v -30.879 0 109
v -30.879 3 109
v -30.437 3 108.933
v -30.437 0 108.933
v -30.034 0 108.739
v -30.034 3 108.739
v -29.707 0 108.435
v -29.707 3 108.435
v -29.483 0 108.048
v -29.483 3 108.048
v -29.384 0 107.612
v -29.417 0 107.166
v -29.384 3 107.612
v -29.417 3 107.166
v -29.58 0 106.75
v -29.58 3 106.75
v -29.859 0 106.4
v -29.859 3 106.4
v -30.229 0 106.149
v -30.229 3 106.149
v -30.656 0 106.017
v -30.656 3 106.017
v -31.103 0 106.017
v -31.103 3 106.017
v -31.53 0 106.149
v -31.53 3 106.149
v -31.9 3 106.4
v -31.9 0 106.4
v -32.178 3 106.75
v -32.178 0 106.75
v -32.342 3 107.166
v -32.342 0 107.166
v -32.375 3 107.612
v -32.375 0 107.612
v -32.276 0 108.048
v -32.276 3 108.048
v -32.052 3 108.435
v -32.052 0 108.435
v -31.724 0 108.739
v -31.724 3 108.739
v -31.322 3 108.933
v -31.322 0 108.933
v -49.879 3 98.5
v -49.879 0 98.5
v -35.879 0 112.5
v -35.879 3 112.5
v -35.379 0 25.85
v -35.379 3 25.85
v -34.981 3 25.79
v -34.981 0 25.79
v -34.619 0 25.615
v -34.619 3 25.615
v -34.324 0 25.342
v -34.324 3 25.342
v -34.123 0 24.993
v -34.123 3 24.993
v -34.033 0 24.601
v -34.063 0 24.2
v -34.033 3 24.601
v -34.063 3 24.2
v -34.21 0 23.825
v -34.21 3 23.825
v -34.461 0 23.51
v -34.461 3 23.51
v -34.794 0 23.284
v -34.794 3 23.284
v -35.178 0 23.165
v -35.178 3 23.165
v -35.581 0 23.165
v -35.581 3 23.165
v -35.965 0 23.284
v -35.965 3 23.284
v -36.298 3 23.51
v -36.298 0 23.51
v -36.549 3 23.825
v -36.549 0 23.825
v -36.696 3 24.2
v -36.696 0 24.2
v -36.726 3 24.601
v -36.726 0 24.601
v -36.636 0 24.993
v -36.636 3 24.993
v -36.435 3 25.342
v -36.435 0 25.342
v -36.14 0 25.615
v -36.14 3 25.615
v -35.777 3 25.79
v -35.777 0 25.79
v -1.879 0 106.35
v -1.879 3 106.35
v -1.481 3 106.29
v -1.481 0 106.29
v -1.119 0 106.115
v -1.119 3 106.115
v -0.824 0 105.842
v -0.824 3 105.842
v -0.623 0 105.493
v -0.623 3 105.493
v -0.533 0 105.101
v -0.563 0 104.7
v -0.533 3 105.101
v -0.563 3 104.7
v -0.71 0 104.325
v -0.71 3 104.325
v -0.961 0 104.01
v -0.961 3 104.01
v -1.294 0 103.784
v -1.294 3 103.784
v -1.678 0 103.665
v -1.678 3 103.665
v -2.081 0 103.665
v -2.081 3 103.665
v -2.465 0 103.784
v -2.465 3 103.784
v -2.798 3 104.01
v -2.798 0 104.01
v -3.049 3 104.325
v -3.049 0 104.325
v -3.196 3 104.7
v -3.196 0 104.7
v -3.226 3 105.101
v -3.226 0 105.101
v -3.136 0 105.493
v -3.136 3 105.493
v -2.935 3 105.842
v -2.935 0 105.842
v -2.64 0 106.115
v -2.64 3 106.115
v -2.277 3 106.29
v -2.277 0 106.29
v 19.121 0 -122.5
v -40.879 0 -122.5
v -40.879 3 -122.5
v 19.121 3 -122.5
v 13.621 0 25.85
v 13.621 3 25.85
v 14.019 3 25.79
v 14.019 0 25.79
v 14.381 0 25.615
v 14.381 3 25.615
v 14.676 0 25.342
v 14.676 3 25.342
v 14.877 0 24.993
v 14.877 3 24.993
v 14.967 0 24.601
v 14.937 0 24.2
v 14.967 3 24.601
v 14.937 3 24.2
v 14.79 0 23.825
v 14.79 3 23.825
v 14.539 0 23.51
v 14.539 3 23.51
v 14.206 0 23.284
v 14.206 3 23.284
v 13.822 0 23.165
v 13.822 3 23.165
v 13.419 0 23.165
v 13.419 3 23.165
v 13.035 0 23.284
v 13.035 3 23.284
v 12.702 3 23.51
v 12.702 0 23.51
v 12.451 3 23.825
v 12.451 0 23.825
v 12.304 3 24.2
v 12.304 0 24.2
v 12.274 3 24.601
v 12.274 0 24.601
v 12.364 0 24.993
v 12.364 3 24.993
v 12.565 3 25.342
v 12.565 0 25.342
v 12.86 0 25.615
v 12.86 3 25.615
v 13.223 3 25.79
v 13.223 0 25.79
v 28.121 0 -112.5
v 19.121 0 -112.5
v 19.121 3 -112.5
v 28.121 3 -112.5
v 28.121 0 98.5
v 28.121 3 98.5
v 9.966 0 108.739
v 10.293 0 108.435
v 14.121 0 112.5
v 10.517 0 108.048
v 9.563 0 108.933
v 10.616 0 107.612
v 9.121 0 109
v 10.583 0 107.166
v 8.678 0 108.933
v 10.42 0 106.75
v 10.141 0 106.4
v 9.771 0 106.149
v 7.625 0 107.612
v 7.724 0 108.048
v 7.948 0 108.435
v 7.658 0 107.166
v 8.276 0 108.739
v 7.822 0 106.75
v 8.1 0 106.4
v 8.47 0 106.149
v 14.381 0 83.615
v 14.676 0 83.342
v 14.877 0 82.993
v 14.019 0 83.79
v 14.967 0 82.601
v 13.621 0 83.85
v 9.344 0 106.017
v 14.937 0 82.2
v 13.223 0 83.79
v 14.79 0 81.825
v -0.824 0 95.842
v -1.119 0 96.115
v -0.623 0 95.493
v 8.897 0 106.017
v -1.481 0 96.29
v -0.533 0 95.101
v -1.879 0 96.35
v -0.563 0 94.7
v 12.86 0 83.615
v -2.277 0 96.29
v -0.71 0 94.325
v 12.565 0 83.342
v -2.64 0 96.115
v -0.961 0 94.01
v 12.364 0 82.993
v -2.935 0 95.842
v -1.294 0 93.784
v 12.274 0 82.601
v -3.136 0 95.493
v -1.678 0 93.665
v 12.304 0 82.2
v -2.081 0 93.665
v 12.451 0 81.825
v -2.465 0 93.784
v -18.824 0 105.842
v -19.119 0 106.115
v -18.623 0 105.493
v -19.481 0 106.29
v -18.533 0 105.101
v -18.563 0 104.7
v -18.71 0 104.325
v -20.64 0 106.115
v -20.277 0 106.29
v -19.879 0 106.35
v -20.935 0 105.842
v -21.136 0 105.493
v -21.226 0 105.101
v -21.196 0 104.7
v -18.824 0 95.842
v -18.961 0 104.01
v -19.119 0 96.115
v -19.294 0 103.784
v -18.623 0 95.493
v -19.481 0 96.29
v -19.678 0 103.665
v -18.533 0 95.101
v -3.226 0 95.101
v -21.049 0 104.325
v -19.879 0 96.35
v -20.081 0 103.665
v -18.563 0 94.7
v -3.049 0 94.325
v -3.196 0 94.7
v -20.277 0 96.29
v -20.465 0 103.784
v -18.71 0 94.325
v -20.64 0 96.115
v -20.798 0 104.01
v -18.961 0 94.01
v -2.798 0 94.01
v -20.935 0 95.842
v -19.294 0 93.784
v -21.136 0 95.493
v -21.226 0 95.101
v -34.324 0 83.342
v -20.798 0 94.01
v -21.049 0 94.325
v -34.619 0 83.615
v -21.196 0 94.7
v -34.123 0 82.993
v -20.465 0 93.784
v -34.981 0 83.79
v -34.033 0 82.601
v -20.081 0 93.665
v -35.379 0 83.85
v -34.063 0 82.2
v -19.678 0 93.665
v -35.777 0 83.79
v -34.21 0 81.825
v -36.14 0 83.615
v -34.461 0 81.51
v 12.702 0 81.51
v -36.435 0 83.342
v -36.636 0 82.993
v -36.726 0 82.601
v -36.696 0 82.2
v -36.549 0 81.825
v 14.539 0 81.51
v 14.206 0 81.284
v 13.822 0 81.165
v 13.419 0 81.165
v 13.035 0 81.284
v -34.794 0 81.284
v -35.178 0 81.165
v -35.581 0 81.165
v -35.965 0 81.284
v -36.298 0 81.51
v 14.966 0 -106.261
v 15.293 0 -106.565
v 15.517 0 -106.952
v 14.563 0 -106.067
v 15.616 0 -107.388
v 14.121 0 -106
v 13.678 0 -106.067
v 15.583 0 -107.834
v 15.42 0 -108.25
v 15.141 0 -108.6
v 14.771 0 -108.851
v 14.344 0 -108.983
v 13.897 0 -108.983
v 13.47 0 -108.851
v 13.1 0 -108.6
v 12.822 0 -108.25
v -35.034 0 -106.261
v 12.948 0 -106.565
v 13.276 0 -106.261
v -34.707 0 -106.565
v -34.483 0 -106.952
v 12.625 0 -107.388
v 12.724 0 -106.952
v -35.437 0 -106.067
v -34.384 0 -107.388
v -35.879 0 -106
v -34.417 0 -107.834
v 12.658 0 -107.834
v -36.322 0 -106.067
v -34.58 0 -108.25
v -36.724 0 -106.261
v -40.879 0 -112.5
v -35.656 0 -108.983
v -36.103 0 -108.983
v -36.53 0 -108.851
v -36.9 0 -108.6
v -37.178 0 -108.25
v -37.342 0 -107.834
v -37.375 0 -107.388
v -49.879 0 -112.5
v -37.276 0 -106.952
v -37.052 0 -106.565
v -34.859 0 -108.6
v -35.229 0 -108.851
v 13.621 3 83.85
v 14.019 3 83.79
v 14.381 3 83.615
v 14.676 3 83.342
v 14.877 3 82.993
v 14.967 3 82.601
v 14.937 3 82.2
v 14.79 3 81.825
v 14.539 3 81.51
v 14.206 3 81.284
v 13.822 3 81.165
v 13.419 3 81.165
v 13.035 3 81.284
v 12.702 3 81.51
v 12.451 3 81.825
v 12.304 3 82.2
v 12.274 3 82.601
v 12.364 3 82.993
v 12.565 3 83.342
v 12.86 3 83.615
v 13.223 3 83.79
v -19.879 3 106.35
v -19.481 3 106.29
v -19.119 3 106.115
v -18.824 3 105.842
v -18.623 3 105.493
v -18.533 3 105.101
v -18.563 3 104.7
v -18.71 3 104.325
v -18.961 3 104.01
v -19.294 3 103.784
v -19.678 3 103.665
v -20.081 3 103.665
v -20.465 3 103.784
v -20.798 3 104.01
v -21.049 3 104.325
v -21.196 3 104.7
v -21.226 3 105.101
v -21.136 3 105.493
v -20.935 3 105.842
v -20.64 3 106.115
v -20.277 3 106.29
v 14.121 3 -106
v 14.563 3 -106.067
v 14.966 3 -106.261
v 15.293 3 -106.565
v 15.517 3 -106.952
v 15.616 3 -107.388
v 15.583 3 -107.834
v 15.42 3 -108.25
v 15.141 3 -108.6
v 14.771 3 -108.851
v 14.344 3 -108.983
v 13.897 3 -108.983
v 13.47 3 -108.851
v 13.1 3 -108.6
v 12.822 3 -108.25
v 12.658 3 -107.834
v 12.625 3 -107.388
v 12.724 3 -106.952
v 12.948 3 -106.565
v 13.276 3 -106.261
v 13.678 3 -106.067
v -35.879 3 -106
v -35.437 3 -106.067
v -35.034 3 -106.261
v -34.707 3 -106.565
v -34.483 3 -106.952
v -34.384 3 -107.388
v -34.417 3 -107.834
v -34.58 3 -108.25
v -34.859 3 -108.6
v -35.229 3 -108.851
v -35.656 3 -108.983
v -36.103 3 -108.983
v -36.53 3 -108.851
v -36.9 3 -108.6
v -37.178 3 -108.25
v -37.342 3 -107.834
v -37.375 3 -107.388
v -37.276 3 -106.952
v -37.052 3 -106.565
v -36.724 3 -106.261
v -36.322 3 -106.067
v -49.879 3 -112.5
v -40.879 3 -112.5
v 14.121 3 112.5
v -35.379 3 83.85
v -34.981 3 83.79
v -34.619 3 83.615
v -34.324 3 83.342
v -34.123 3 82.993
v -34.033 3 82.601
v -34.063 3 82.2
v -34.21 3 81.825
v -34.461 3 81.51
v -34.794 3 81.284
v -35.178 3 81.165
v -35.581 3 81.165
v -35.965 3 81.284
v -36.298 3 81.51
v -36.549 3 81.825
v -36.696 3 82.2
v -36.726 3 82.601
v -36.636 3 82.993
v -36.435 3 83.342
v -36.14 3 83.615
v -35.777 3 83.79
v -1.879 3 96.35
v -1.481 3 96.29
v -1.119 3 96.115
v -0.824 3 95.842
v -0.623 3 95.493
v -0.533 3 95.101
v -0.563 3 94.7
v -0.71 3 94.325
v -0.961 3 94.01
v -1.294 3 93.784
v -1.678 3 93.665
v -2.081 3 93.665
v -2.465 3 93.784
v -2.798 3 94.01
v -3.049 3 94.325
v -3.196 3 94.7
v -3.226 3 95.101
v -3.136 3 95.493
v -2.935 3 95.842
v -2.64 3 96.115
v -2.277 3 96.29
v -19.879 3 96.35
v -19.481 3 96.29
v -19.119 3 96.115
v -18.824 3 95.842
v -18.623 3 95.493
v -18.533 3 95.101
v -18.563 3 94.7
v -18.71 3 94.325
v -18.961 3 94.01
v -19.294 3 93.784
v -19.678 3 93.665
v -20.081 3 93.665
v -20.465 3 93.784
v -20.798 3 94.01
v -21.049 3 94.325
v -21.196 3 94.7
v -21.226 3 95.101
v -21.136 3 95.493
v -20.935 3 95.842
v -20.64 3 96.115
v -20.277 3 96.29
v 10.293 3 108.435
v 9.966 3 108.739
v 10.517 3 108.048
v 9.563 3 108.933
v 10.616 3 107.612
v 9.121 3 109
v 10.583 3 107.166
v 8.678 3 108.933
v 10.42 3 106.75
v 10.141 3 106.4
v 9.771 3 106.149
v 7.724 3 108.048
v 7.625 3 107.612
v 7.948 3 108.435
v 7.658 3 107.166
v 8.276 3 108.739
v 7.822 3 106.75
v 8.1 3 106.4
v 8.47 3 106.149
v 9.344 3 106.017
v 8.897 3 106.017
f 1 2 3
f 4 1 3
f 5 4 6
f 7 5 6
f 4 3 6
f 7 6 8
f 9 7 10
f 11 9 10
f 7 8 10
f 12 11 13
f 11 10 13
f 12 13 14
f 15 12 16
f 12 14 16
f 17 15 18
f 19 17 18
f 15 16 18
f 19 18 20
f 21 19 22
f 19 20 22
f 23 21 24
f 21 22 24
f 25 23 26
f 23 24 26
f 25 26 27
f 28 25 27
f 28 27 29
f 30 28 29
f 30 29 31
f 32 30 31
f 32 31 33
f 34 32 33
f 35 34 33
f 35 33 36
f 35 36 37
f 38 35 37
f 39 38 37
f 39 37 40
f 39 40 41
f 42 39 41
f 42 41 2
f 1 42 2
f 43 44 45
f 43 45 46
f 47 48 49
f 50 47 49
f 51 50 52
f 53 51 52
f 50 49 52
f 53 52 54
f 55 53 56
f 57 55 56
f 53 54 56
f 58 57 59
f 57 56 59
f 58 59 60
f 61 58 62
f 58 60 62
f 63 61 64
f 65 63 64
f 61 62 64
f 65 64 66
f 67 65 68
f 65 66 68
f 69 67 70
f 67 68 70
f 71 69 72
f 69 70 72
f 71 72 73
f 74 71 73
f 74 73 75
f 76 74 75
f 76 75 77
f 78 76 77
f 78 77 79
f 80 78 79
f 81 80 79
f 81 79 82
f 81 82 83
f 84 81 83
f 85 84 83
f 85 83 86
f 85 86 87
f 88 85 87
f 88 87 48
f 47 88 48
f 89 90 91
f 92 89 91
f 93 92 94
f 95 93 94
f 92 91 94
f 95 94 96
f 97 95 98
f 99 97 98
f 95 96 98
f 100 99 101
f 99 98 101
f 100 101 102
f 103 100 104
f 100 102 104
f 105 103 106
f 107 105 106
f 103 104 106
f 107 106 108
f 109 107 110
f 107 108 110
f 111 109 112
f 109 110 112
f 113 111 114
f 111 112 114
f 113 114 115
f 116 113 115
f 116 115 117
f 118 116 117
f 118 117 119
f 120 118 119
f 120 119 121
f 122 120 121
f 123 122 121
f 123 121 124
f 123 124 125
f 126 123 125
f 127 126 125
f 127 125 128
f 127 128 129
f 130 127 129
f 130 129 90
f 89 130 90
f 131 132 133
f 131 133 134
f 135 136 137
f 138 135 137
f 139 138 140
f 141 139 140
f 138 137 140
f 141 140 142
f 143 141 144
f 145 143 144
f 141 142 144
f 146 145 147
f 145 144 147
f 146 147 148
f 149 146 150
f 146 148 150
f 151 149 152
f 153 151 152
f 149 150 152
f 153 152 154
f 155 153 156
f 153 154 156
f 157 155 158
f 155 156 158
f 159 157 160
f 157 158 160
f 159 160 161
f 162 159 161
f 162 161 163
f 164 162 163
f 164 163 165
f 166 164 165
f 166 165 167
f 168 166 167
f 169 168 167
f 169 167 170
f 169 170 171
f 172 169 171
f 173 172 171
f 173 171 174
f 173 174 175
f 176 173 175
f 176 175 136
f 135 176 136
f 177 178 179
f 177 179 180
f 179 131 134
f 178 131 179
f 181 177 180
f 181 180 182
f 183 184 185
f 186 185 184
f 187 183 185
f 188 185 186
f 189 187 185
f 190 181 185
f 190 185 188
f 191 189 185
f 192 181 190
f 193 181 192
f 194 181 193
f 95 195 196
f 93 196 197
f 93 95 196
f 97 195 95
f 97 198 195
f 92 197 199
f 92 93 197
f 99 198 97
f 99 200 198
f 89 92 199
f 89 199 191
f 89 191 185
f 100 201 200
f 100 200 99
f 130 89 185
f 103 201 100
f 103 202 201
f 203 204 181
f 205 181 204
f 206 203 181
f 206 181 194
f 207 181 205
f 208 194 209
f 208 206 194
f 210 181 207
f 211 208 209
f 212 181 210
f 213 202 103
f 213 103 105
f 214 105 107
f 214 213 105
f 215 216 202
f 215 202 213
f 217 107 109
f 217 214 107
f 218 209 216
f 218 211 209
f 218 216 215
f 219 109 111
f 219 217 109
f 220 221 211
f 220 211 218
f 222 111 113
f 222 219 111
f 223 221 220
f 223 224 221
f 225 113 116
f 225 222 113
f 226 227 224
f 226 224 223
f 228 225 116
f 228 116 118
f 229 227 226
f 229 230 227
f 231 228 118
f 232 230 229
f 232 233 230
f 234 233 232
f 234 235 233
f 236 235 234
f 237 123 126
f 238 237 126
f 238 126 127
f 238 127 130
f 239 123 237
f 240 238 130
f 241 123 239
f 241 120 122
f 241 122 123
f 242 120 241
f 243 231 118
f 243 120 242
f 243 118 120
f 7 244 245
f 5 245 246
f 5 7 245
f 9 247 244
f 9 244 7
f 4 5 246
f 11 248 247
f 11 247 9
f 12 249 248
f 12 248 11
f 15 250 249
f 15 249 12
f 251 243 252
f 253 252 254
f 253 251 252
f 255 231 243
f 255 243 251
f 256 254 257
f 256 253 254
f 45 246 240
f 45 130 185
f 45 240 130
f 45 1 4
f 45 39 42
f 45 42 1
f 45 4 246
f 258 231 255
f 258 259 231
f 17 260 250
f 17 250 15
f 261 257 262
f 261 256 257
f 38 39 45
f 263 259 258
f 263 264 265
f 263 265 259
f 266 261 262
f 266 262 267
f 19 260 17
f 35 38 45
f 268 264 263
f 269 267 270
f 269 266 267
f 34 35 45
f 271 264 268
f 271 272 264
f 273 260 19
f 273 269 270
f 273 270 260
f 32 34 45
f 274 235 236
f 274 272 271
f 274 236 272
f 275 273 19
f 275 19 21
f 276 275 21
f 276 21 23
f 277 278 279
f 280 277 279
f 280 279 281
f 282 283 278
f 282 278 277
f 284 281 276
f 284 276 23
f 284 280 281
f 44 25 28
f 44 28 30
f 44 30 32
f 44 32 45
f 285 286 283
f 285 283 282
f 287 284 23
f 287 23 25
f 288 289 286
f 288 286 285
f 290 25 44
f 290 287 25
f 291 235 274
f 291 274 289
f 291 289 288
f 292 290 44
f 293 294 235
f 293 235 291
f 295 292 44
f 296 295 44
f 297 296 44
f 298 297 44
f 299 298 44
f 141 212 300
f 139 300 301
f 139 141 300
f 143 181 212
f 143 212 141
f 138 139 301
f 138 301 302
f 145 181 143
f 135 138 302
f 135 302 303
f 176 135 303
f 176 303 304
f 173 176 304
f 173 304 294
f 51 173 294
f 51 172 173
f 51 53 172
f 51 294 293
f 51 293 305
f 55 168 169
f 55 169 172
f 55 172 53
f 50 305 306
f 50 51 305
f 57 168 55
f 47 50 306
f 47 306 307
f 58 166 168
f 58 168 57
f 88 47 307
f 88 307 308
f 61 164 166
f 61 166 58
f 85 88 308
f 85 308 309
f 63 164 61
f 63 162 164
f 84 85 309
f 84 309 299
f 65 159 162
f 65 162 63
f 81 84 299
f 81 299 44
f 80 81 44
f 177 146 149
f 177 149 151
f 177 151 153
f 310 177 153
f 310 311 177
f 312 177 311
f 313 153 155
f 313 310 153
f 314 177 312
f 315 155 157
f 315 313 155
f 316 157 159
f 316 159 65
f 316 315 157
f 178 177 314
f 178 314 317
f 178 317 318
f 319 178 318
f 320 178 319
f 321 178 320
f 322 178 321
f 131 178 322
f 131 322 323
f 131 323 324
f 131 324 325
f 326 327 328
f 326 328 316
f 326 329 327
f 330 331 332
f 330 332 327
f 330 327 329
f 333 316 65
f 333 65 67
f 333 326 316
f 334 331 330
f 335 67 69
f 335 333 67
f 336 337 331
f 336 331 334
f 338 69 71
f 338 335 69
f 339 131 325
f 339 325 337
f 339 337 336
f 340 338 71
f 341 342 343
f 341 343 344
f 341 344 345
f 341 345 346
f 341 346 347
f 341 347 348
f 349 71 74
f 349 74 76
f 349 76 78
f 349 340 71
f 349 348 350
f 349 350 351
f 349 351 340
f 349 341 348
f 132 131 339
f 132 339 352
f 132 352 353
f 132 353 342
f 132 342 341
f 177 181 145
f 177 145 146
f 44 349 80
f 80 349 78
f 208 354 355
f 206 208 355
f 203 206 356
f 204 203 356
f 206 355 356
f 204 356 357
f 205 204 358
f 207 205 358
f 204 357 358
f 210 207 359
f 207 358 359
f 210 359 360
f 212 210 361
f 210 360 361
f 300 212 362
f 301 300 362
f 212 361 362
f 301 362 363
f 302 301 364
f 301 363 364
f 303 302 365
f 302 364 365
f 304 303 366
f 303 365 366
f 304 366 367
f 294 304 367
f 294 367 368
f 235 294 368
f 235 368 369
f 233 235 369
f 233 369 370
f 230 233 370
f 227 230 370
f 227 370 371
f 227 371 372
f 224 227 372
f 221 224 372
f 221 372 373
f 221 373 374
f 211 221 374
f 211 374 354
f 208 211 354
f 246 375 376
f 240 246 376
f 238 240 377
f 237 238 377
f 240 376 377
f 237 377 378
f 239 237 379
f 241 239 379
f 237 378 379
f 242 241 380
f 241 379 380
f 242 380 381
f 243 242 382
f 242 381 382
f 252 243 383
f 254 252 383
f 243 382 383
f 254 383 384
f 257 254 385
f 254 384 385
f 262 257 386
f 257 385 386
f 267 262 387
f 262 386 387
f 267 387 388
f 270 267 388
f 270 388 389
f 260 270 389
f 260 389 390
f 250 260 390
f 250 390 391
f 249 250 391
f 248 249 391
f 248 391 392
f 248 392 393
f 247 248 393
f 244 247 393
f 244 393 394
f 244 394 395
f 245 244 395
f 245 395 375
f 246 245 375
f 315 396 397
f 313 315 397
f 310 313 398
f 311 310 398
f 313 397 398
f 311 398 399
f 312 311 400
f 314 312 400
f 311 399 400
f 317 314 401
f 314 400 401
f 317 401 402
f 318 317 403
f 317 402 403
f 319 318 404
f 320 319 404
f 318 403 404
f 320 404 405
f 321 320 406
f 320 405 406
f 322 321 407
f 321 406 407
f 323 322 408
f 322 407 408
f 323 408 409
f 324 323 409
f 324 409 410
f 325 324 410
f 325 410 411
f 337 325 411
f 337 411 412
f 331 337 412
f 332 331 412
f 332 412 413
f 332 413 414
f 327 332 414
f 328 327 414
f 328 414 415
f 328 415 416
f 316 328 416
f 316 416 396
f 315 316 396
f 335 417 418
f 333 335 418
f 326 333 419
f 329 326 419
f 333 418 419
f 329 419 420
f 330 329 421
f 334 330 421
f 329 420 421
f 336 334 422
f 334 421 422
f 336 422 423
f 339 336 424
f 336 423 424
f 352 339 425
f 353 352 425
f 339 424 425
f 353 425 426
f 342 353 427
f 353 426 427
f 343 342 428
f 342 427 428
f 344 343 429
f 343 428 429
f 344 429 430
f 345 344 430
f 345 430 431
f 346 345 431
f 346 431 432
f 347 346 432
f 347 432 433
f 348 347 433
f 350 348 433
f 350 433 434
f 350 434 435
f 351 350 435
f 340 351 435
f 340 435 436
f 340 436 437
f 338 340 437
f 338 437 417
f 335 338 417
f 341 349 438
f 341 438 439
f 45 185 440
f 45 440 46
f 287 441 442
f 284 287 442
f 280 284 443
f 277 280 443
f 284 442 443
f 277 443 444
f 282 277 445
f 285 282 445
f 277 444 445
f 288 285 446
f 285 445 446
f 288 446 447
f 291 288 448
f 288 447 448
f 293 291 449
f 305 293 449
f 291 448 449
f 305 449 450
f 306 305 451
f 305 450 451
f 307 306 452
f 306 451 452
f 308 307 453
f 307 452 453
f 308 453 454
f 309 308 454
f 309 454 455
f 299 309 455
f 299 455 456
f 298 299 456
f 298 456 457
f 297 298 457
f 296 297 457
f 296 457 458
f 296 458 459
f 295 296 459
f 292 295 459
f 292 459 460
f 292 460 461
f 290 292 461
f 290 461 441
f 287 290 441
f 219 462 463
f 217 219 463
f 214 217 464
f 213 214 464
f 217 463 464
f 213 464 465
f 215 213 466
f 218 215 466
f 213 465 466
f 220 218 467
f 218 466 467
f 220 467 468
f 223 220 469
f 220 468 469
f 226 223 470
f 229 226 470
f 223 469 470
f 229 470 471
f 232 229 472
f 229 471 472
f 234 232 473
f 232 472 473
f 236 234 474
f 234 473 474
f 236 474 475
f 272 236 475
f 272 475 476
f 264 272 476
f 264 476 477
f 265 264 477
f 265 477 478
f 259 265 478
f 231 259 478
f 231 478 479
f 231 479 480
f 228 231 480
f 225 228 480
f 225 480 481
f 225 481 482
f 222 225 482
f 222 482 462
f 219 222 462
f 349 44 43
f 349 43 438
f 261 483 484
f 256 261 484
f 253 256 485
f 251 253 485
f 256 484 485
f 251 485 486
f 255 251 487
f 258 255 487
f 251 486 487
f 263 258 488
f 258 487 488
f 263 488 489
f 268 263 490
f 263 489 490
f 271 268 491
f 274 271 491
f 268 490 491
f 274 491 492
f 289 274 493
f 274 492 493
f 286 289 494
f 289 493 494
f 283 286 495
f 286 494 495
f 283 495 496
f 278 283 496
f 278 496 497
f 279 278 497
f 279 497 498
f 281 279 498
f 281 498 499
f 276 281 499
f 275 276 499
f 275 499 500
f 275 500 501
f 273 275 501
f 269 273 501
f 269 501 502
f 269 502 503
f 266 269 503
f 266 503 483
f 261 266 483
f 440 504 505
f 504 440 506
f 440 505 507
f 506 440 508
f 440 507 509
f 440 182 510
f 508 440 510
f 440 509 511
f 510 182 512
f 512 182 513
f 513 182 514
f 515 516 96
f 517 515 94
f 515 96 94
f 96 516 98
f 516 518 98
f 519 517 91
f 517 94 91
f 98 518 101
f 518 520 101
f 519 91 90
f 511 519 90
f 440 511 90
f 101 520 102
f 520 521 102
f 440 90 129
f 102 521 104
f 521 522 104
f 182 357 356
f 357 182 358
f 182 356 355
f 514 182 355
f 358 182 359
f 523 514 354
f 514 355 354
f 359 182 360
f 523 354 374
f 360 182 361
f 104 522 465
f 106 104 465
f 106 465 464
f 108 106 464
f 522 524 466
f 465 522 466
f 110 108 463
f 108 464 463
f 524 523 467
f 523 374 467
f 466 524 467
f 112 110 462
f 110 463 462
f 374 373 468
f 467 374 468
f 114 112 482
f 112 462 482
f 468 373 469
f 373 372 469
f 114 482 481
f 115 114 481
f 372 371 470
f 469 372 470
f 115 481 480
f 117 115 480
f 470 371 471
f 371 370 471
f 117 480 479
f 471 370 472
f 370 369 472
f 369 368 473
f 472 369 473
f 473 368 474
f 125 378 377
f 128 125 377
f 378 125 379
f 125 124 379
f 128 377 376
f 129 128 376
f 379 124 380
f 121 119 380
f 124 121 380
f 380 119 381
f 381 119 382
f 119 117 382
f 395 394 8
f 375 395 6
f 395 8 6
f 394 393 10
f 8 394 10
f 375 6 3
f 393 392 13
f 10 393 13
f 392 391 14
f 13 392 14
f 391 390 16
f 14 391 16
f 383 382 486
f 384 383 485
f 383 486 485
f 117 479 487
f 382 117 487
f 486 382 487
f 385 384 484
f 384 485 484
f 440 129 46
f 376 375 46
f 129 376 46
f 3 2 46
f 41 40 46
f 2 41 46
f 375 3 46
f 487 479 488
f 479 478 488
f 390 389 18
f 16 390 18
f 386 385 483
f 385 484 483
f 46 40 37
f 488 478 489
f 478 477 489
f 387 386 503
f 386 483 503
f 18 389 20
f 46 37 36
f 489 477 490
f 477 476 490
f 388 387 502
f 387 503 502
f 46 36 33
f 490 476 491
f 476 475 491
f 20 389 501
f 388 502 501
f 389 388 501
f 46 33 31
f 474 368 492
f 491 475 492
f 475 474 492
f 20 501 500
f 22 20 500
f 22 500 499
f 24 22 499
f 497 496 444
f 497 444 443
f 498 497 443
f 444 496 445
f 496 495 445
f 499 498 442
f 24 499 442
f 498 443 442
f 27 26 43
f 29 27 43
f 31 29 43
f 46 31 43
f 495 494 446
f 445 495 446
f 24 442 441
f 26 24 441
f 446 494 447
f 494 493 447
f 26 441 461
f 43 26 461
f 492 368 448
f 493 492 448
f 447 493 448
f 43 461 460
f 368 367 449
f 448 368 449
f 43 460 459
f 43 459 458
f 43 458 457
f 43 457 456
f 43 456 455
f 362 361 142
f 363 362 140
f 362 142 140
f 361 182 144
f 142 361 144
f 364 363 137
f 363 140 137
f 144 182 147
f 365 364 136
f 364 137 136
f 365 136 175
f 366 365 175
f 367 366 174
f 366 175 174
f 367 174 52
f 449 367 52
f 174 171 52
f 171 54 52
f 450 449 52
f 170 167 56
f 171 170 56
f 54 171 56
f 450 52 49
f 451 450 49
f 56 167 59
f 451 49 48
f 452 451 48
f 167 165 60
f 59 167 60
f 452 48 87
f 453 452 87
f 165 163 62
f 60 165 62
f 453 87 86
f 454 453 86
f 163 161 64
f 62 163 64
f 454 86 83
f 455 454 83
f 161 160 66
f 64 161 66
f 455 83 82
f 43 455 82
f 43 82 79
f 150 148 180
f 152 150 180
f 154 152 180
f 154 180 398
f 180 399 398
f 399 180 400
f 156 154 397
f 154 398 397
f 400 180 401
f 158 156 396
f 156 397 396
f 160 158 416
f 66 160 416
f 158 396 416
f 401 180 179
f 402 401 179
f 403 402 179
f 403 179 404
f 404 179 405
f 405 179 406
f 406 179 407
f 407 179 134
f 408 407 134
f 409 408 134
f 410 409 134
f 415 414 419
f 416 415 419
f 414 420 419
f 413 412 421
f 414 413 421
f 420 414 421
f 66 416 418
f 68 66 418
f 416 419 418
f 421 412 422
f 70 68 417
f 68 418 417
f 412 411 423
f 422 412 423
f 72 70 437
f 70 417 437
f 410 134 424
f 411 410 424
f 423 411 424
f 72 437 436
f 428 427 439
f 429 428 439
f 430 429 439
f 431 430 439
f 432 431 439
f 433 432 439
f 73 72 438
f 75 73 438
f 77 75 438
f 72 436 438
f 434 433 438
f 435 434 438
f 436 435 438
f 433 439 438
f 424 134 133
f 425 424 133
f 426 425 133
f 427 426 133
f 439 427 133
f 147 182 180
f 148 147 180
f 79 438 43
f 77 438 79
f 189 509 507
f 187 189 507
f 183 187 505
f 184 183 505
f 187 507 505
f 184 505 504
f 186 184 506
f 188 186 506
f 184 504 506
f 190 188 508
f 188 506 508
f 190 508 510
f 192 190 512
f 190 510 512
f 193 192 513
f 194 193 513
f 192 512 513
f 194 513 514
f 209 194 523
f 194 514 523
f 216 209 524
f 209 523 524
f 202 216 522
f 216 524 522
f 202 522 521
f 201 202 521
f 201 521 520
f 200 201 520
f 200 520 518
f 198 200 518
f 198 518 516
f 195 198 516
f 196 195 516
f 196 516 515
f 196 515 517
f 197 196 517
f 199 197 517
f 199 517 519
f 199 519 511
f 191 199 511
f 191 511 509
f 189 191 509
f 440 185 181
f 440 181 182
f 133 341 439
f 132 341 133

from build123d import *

# Parameters (mm, degrees)
BOSS_EXTRUDE1_DEPTH = 3
SKETCH2_R           = 1.5
SKETCH2_R_2         = 1.35
CUT_EXTRUDE1_DEPTH  = 25
CHAMFER1_SIZE       = 14


with BuildPart() as part:
    # Sketch1 → Boss-Extrude1 (new body)
    with BuildSketch(Plane(origin=(0, 0, 0), x_dir=(1, 0, 0), z_dir=(0, 1, 0))):
        Polygon((19.120621977, 112.5), (28.120621977, 112.5), (28.120621977, -112.5), (-49.879378023, -112.5), (-49.879378023, 112.5), (-40.879378023, 112.5), (-40.879378023, 122.5), (19.120621977, 122.5), align=None)
    extrude(amount=BOSS_EXTRUDE1_DEPTH)

    # Sketch2 → Cut-Extrude1 (cut)
    with BuildSketch(Plane(origin=(0, 3, 0), x_dir=(1, 0, 0), z_dir=(0, 1, 0))):
        with Locations(Location((14.120621977, 107.5, 0), (0, 0, 270))):
            Circle(SKETCH2_R)
        with Locations(Location((-35.879378023, 107.5, 0), (0, 0, 270))):
            Circle(SKETCH2_R)
        with Locations(Location((-30.879378023, -107.5, 0), (0, 0, 270))):
            Circle(SKETCH2_R)
        with Locations(Location((9.120621977, -107.5, 0), (0, 0, 270))):
            Circle(SKETCH2_R)
        with Locations(Location((-35.379378023, -82.5, 0), (0, 0, 270))):
            Circle(SKETCH2_R_2)
        with Locations(Location((13.620621977, -82.5, 0), (0, 0, 270))):
            Circle(SKETCH2_R_2)
        with Locations(Location((-35.379378023, -24.5, 0), (0, 0, 270))):
            Circle(SKETCH2_R_2)
        with Locations(Location((13.620621977, -24.5, 0), (0, 0, 270))):
            Circle(SKETCH2_R_2)
        with Locations(Location((-19.879378023, -105, 0), (0, 0, 270))):
            Circle(SKETCH2_R_2)
        with Locations(Location((-1.879378023, -105, 0), (0, 0, 270))):
            Circle(SKETCH2_R_2)
        with Locations(Location((-19.879378023, -95, 0), (0, 0, 270))):
            Circle(SKETCH2_R_2)
        with Locations(Location((-1.879378023, -95, 0), (0, 0, 270))):
            Circle(SKETCH2_R_2)
    extrude(amount=-CUT_EXTRUDE1_DEPTH, mode=Mode.SUBTRACT)

    # Chamfer1
    chamfer1_edges = [part.edges().sort_by_distance(p)[0] for p in [
        (28.120621977, 1.5, 112.5),
        (-49.879378023, 1.5, 112.5),
    ]]
    chamfer(chamfer1_edges, length=CHAMFER1_SIZE)


solid = part.part
